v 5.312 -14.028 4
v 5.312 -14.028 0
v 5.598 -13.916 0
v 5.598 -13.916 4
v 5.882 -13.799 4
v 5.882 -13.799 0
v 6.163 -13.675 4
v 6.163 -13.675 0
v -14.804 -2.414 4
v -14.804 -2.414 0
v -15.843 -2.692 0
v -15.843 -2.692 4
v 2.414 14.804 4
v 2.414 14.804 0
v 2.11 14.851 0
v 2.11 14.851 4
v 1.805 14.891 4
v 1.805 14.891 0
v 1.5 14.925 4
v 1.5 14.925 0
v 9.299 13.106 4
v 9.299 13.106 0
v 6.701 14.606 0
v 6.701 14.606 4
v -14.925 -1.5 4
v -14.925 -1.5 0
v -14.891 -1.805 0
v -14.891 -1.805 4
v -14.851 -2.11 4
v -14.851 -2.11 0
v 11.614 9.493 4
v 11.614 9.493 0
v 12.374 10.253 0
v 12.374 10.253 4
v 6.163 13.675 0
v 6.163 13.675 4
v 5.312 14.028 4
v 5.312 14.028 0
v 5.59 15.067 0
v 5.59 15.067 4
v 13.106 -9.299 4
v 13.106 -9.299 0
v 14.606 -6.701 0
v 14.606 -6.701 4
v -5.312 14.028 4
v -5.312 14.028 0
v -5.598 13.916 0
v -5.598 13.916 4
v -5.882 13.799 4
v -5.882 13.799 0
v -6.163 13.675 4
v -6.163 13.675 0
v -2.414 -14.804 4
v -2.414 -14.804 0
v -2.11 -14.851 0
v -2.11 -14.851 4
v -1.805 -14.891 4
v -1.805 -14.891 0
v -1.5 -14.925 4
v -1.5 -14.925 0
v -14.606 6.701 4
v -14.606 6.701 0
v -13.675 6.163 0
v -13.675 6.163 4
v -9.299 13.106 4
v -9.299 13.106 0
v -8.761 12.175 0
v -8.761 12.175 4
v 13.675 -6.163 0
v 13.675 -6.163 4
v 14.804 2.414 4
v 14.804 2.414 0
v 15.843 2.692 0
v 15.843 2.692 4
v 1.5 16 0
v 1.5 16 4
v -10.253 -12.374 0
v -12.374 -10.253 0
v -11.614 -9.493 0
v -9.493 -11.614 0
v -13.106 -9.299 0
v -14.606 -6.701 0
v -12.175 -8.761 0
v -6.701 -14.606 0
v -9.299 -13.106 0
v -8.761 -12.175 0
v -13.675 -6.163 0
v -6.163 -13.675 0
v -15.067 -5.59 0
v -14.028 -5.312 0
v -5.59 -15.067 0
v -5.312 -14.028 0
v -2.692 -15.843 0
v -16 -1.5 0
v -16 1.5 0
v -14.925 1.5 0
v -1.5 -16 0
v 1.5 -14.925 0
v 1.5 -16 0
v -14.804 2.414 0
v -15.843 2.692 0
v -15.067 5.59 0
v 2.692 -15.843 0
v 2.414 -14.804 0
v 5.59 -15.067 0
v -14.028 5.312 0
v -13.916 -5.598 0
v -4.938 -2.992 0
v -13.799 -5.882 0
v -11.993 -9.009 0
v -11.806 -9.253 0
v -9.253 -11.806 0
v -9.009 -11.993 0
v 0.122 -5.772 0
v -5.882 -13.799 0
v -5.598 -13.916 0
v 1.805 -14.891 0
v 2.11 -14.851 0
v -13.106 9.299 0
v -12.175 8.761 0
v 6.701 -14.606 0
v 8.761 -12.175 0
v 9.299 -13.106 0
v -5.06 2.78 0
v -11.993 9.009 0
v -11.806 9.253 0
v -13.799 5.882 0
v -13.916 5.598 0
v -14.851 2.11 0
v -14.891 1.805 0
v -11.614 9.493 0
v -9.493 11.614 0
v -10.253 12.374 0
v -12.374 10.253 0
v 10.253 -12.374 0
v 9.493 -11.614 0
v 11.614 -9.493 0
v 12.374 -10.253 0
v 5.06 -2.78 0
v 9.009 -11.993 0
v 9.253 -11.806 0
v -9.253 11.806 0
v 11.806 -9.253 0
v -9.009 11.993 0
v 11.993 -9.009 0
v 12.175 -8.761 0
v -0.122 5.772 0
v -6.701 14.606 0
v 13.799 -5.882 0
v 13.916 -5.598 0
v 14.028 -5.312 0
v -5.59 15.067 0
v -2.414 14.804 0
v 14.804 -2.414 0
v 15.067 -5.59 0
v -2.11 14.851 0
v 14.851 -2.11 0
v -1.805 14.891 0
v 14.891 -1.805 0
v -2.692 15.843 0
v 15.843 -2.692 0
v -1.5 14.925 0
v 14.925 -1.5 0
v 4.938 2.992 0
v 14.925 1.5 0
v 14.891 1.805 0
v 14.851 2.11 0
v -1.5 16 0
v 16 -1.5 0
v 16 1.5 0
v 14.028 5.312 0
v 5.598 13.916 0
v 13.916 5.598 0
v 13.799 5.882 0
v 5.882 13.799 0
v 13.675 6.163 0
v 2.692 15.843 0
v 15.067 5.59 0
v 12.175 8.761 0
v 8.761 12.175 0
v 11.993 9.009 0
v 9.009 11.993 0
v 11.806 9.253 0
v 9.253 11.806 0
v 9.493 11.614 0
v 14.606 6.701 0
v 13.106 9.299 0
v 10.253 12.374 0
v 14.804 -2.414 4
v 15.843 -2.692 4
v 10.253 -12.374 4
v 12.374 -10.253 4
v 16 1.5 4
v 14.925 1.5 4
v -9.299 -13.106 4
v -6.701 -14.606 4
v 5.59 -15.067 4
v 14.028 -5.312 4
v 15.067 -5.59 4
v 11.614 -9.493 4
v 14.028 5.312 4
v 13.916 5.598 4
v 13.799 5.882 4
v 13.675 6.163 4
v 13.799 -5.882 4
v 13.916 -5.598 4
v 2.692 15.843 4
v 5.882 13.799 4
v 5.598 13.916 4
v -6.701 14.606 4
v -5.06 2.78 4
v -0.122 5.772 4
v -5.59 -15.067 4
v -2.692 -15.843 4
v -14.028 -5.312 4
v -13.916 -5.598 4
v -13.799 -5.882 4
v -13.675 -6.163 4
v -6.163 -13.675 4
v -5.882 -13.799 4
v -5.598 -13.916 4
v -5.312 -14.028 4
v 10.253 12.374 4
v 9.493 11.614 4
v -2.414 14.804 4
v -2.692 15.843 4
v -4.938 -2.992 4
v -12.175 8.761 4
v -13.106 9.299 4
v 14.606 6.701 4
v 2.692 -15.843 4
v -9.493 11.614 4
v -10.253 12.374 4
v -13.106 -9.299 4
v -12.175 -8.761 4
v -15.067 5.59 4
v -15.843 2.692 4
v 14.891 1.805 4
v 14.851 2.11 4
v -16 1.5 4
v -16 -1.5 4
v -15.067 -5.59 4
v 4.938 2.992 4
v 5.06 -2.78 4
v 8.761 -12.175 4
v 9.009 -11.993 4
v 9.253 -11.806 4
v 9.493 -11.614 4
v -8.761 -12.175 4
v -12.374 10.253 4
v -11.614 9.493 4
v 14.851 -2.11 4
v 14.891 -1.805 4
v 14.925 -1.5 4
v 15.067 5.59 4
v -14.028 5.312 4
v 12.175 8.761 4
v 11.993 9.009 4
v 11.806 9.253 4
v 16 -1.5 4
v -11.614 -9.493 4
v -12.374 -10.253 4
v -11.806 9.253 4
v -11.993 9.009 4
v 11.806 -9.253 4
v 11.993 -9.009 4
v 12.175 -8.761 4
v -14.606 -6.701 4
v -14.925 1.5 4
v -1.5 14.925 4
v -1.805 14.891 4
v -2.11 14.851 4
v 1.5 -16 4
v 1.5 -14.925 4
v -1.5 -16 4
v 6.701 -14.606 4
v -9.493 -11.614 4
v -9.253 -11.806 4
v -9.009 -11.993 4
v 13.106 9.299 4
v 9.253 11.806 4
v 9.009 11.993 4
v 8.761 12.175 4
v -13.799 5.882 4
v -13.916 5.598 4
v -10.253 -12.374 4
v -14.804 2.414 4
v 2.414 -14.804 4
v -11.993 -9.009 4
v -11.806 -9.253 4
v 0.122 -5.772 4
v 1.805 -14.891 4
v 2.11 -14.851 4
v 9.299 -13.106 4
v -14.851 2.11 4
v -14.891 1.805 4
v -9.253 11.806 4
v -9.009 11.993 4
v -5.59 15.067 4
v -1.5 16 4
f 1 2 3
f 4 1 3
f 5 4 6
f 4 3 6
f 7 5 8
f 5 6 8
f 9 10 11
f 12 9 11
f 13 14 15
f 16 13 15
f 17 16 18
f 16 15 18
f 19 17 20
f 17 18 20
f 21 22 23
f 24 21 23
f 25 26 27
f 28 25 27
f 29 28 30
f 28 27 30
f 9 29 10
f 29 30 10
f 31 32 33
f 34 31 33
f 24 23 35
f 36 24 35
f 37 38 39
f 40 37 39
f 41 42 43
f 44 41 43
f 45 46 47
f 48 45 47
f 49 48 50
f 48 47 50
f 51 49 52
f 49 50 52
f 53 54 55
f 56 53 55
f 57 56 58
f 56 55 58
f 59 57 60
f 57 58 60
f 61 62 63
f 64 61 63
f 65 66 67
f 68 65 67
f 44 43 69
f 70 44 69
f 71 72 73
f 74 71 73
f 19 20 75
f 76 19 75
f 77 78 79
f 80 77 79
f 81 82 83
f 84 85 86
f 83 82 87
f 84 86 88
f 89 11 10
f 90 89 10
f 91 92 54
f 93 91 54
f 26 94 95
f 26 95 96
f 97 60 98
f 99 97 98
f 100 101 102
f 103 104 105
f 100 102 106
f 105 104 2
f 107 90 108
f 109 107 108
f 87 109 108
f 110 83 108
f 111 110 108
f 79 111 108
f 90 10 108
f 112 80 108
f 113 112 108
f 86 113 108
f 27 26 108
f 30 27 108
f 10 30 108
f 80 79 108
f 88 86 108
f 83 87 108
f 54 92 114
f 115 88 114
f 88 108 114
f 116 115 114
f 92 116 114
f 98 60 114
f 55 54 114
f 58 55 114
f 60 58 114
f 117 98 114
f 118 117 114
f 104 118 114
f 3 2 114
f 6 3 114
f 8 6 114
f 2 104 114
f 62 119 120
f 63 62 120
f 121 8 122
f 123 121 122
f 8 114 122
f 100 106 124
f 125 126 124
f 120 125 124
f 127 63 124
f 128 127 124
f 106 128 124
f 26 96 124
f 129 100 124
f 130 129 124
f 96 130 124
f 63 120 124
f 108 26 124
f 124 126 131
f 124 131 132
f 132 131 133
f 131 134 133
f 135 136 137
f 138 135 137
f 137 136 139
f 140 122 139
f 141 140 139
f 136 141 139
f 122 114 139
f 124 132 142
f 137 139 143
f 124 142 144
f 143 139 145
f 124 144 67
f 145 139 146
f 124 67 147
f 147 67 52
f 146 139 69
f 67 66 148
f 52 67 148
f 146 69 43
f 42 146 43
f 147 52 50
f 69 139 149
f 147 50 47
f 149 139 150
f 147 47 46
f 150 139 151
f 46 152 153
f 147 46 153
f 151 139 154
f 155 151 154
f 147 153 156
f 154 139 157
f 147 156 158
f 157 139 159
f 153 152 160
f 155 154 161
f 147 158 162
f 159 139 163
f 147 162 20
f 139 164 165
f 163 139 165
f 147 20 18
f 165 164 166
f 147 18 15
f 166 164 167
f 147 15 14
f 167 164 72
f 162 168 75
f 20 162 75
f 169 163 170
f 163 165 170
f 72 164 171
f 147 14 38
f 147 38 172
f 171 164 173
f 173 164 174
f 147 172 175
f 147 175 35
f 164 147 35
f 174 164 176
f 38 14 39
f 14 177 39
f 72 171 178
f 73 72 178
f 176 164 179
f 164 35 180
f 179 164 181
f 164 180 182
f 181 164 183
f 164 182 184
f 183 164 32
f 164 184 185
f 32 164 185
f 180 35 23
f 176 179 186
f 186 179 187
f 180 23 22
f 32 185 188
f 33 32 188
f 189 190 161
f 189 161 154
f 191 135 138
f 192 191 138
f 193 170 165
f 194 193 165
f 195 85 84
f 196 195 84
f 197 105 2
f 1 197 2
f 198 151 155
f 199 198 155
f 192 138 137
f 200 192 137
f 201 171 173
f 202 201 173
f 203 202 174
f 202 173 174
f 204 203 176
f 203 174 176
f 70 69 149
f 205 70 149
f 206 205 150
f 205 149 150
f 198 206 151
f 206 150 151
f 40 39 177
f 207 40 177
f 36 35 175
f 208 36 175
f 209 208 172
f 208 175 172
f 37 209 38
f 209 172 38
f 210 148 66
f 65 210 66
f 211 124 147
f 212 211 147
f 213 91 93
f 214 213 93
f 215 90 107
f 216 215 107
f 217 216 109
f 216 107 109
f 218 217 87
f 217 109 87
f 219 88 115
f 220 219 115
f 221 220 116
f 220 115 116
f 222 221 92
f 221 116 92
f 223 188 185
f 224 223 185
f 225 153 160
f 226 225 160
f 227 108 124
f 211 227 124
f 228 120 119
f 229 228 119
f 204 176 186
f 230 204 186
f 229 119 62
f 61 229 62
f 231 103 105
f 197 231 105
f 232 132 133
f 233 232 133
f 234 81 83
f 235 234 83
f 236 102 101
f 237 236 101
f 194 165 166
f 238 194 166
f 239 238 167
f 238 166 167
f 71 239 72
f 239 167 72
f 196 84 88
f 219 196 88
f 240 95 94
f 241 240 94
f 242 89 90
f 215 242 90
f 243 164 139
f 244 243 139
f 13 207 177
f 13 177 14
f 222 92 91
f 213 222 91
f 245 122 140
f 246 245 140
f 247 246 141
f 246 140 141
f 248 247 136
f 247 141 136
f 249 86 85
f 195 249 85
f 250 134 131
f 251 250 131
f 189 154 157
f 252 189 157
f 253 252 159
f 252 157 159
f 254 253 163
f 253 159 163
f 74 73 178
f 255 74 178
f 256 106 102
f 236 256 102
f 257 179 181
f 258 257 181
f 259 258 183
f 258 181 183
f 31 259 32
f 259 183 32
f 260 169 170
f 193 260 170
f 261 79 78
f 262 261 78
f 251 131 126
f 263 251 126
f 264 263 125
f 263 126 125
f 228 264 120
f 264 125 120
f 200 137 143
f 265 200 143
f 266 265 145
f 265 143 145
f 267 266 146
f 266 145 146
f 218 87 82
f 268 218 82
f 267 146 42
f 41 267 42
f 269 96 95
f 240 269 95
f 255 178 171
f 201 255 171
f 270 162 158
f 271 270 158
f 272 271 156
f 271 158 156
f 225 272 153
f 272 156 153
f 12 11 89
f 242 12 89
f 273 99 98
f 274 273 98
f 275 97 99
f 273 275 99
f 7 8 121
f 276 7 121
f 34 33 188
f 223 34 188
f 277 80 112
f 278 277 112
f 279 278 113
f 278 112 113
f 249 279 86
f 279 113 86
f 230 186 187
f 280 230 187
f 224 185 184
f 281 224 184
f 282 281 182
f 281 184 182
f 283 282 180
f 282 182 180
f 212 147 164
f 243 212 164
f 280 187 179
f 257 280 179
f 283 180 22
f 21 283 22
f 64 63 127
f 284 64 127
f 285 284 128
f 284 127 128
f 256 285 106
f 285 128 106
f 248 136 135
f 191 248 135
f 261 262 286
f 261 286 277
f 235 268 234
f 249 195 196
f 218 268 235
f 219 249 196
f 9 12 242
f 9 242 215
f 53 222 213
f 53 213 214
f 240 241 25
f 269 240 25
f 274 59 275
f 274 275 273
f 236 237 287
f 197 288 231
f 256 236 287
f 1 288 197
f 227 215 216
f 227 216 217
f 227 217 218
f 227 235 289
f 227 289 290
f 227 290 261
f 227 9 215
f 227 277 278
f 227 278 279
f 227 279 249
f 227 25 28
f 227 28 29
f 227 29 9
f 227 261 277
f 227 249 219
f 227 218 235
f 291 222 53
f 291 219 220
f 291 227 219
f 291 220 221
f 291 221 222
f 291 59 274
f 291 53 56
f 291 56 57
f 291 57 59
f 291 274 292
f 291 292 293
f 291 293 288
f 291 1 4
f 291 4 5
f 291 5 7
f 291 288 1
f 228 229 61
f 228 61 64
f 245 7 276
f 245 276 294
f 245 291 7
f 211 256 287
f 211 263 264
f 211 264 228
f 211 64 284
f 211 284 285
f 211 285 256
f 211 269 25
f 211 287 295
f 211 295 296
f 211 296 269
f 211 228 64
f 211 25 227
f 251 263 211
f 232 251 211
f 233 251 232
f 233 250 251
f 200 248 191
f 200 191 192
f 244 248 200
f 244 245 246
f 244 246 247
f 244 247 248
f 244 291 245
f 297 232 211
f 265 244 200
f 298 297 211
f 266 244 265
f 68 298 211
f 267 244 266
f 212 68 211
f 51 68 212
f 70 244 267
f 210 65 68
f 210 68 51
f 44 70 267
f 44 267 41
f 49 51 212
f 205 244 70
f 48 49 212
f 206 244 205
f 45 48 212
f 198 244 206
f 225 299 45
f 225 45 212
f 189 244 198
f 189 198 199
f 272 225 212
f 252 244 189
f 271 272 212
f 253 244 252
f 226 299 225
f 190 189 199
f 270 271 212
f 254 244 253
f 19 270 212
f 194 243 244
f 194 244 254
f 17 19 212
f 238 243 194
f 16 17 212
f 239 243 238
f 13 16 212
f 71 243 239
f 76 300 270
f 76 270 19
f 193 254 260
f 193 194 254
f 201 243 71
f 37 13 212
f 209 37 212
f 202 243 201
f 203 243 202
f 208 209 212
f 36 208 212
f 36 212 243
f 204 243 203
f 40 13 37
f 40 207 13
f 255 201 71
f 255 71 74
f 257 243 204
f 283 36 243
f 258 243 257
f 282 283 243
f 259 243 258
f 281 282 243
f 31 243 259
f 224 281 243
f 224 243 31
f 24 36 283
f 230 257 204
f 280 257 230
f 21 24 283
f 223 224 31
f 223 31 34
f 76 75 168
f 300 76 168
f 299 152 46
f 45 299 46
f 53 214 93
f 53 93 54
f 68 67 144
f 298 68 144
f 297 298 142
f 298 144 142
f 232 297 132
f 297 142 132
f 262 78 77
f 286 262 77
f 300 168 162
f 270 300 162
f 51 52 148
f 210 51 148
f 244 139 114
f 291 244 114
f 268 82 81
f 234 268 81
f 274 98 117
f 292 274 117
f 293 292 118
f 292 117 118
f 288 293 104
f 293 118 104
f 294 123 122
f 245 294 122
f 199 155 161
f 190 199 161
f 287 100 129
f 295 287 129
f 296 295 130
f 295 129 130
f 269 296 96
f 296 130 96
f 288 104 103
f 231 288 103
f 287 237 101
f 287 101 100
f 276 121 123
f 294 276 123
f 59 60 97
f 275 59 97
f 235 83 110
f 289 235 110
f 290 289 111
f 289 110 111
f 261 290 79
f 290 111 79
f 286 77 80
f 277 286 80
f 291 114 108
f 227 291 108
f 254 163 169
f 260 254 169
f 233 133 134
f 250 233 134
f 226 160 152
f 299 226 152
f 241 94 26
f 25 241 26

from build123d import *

# Parameters (mm, degrees)
F1_DEPTH = 4


with BuildPart() as f1:
    # F0 (on Top) → F1 (new body)
    with BuildSketch(Plane.XY):
        with BuildLine():
            ThreePointArc((-14.80449, -2.413937), (-14.488887, -3.882286), (-14.028032, -5.311714))
            Line((-14.028032, -5.311714), (-13.134733, -5.072355))
            Line((-13.134733, -5.072355), (-13.91119, -2.174578))
            Line((-13.91119, -2.174578), (-14.80449, -2.413937))
        make_face()
        with BuildLine():
            Line((-10.253048, -12.374369), (-9.492775, -11.614096))
            ThreePointArc((-9.492775, -11.614096), (-10.606602, -10.606602), (-11.614096, -9.492775))
            Line((-11.614096, -9.492775), (-12.374369, -10.253048))
            Line((-12.374369, -10.253048), (-10.253048, -12.374369))
        make_face()
        with BuildLine():
            Line((14.606406, -6.700962), (13.675266, -6.163368))
            ThreePointArc((13.675266, -6.163368), (12.990381, -7.5), (12.175266, -8.761444))
            Line((12.175266, -8.761444), (13.106406, -9.299038))
            Line((13.106406, -9.299038), (14.606406, -6.700962))
        make_face()
        with BuildLine():
            Line((-14, 1.5), (-14.924812, 1.5))
            ThreePointArc((-14.924812, 1.5), (-15, 0), (-14.924812, -1.5))
            Line((-14.924812, -1.5), (-14, -1.5))
            Line((-14, -1.5), (-14, 1.5))
        make_face()
        with BuildLine():
            Line((12.374369, -10.253048), (11.614096, -9.492775))
            ThreePointArc((11.614096, -9.492775), (10.606602, -10.606602), (9.492775, -11.614096))
            Line((9.492775, -11.614096), (10.253048, -12.374369))
            Line((10.253048, -12.374369), (12.374369, -10.253048))
        make_face()
        with BuildLine():
            Line((-13.134733, 5.072355), (-14.028032, 5.311714))
            ThreePointArc((-14.028032, 5.311714), (-14.488887, 3.882286), (-14.80449, 2.413937))
            Line((-14.80449, 2.413937), (-13.91119, 2.174578))
            Line((-13.91119, 2.174578), (-13.134733, 5.072355))
        make_face()
        with BuildLine():
            Line((-13.106406, -9.299038), (-12.175266, -8.761444))
            ThreePointArc((-12.175266, -8.761444), (-12.990381, -7.5), (-13.675266, -6.163368))
            Line((-13.675266, -6.163368), (-14.606406, -6.700962))
            Line((-14.606406, -6.700962), (-13.106406, -9.299038))
        make_face()
        with BuildLine():
            Line((9.299038, -13.106406), (8.761444, -12.175266))
            ThreePointArc((8.761444, -12.175266), (7.5, -12.990381), (6.163368, -13.675266))
            Line((6.163368, -13.675266), (6.700962, -14.606406))
            Line((6.700962, -14.606406), (9.299038, -13.106406))
        make_face()
        with BuildLine():
            Line((-11.374356, 8.299038), (-12.175266, 8.761444))
            ThreePointArc((-12.175266, 8.761444), (-12.990381, 7.5), (-13.675266, 6.163368))
            Line((-13.675266, 6.163368), (-12.874356, 5.700962))
            Line((-12.874356, 5.700962), (-11.374356, 8.299038))
        make_face()
        with BuildLine():
            Line((5.589993, -15.066585), (5.311714, -14.028032))
            ThreePointArc((5.311714, -14.028032), (3.882286, -14.488887), (2.413937, -14.80449))
            Line((2.413937, -14.80449), (2.692216, -15.843042))
            Line((2.692216, -15.843042), (5.589993, -15.066585))
        make_face()
        with BuildLine():
            Line((-8.838835, 10.960155), (-9.492775, 11.614096))
            ThreePointArc((-9.492775, 11.614096), (-10.606602, 10.606602), (-11.614096, 9.492775))
            Line((-11.614096, 9.492775), (-10.960155, 8.838835))
            Line((-10.960155, 8.838835), (-8.838835, 10.960155))
        make_face()
        with BuildLine():
            Line((14, 1.5), (14.924812, 1.5))
            ThreePointArc((14.924812, 1.5), (14.871673, 1.957893), (14.80449, 2.413937))
            Line((14.80449, 2.413937), (13.91119, 2.174578))
            Line((13.91119, 2.174578), (13.134733, 5.072355))
            Line((13.134733, 5.072355), (14.028032, 5.311714))
            ThreePointArc((14.028032, 5.311714), (13.858193, 5.740251), (13.675266, 6.163368))
            Line((13.675266, 6.163368), (12.874356, 5.700962))
            Line((12.874356, 5.700962), (11.374356, 8.299038))
            Line((11.374356, 8.299038), (12.175266, 8.761444))
            ThreePointArc((12.175266, 8.761444), (11.9003, 9.131421), (11.614096, 9.492775))
            Line((11.614096, 9.492775), (10.960155, 8.838835))
            Line((10.960155, 8.838835), (8.838835, 10.960155))
            Line((8.838835, 10.960155), (9.492775, 11.614096))
            ThreePointArc((9.492775, 11.614096), (9.131421, 11.9003), (8.761444, 12.175266))
            Line((8.761444, 12.175266), (8.299038, 11.374356))
            Line((8.299038, 11.374356), (5.700962, 12.874356))
            Line((5.700962, 12.874356), (6.163368, 13.675266))
            ThreePointArc((6.163368, 13.675266), (5.740251, 13.858193), (5.311714, 14.028032))
            Line((5.311714, 14.028032), (5.072355, 13.134733))
            Line((5.072355, 13.134733), (2.174578, 13.91119))
            Line((2.174578, 13.91119), (2.413937, 14.80449))
            ThreePointArc((2.413937, 14.80449), (1.957893, 14.871673), (1.5, 14.924812))
            Line((1.5, 14.924812), (1.5, 14))
            Line((1.5, 14), (-1.5, 14))
            Line((-1.5, 14), (-1.5, 14.924812))
            ThreePointArc((-1.5, 14.924812), (-1.957893, 14.871673), (-2.413937, 14.80449))
            Line((-2.413937, 14.80449), (-2.174578, 13.91119))
            Line((-2.174578, 13.91119), (-5.072355, 13.134733))
            Line((-5.072355, 13.134733), (-5.311714, 14.028032))
            ThreePointArc((-5.311714, 14.028032), (-5.740251, 13.858193), (-6.163368, 13.675266))
            Line((-6.163368, 13.675266), (-5.700962, 12.874356))
            Line((-5.700962, 12.874356), (-8.299038, 11.374356))
            Line((-8.299038, 11.374356), (-8.761444, 12.175266))
            ThreePointArc((-8.761444, 12.175266), (-9.131421, 11.9003), (-9.492775, 11.614096))
            Line((-9.492775, 11.614096), (-8.838835, 10.960155))
            Line((-8.838835, 10.960155), (-10.960155, 8.838835))
            Line((-10.960155, 8.838835), (-11.614096, 9.492775))
            ThreePointArc((-11.614096, 9.492775), (-11.9003, 9.131421), (-12.175266, 8.761444))
            Line((-12.175266, 8.761444), (-11.374356, 8.299038))
            Line((-11.374356, 8.299038), (-12.874356, 5.700962))
            Line((-12.874356, 5.700962), (-13.675266, 6.163368))
            ThreePointArc((-13.675266, 6.163368), (-13.858193, 5.740251), (-14.028032, 5.311714))
            Line((-14.028032, 5.311714), (-13.134733, 5.072355))
            Line((-13.134733, 5.072355), (-13.91119, 2.174578))
            Line((-13.91119, 2.174578), (-14.80449, 2.413937))
            ThreePointArc((-14.80449, 2.413937), (-14.871673, 1.957893), (-14.924812, 1.5))
            Line((-14.924812, 1.5), (-14, 1.5))
            Line((-14, 1.5), (-14, -1.5))
            Line((-14, -1.5), (-14.924812, -1.5))
            ThreePointArc((-14.924812, -1.5), (-14.871673, -1.957893), (-14.80449, -2.413937))
            Line((-14.80449, -2.413937), (-13.91119, -2.174578))
            Line((-13.91119, -2.174578), (-13.134733, -5.072355))
            Line((-13.134733, -5.072355), (-14.028032, -5.311714))
            ThreePointArc((-14.028032, -5.311714), (-13.858193, -5.740251), (-13.675266, -6.163368))
            Line((-13.675266, -6.163368), (-12.874356, -5.700962))
            Line((-12.874356, -5.700962), (-11.374356, -8.299038))
            Line((-11.374356, -8.299038), (-12.175266, -8.761444))
            ThreePointArc((-12.175266, -8.761444), (-11.9003, -9.131421), (-11.614096, -9.492775))
            Line((-11.614096, -9.492775), (-10.960155, -8.838835))
            Line((-10.960155, -8.838835), (-8.838835, -10.960155))
            Line((-8.838835, -10.960155), (-9.492775, -11.614096))
            ThreePointArc((-9.492775, -11.614096), (-9.131421, -11.9003), (-8.761444, -12.175266))
            Line((-8.761444, -12.175266), (-8.299038, -11.374356))
            Line((-8.299038, -11.374356), (-5.700962, -12.874356))
            Line((-5.700962, -12.874356), (-6.163368, -13.675266))
            ThreePointArc((-6.163368, -13.675266), (-5.740251, -13.858193), (-5.311714, -14.028032))
            Line((-5.311714, -14.028032), (-5.072355, -13.134733))
            Line((-5.072355, -13.134733), (-2.174578, -13.91119))
            Line((-2.174578, -13.91119), (-2.413937, -14.80449))
            ThreePointArc((-2.413937, -14.80449), (-1.957893, -14.871673), (-1.5, -14.924812))
            Line((-1.5, -14.924812), (-1.5, -14))
            Line((-1.5, -14), (1.5, -14))
            Line((1.5, -14), (1.5, -14.924812))
            ThreePointArc((1.5, -14.924812), (1.957893, -14.871673), (2.413937, -14.80449))
            Line((2.413937, -14.80449), (2.174578, -13.91119))
            Line((2.174578, -13.91119), (5.072355, -13.134733))
            Line((5.072355, -13.134733), (5.311714, -14.028032))
            ThreePointArc((5.311714, -14.028032), (5.740251, -13.858193), (6.163368, -13.675266))
            Line((6.163368, -13.675266), (5.700962, -12.874356))
            Line((5.700962, -12.874356), (8.299038, -11.374356))
            Line((8.299038, -11.374356), (8.761444, -12.175266))
            ThreePointArc((8.761444, -12.175266), (9.131421, -11.9003), (9.492775, -11.614096))
            Line((9.492775, -11.614096), (8.838835, -10.960155))
            Line((8.838835, -10.960155), (10.960155, -8.838835))
            Line((10.960155, -8.838835), (11.614096, -9.492775))
            ThreePointArc((11.614096, -9.492775), (11.9003, -9.131421), (12.175266, -8.761444))
            Line((12.175266, -8.761444), (11.374356, -8.299038))
            Line((11.374356, -8.299038), (12.874356, -5.700962))
            Line((12.874356, -5.700962), (13.675266, -6.163368))
            ThreePointArc((13.675266, -6.163368), (13.858193, -5.740251), (14.028032, -5.311714))
            Line((14.028032, -5.311714), (13.134733, -5.072355))
            Line((13.134733, -5.072355), (13.91119, -2.174578))
            Line((13.91119, -2.174578), (14.80449, -2.413937))
            ThreePointArc((14.80449, -2.413937), (14.871673, -1.957893), (14.924812, -1.5))
            Line((14.924812, -1.5), (14, -1.5))
            Line((14, -1.5), (14, 1.5))
        make_face()
        Polygon((5.059899, -2.780423), (0.122032, -5.772213), (-4.937867, -2.991789), (-5.059899, 2.780423), (-0.122032, 5.772213), (4.937867, 2.991789), align=None, mode=Mode.SUBTRACT)
        with BuildLine():
            Line((1.5, -16), (1.5, -14.924812))
            ThreePointArc((1.5, -14.924812), (0, -15), (-1.5, -14.924812))
            Line((-1.5, -14.924812), (-1.5, -16))
            Line((-1.5, -16), (1.5, -16))
        make_face()
        with BuildLine():
            Line((-6.700962, -14.606406), (-6.163368, -13.675266))
            ThreePointArc((-6.163368, -13.675266), (-7.5, -12.990381), (-8.761444, -12.175266))
            Line((-8.761444, -12.175266), (-9.299038, -13.106406))
            Line((-9.299038, -13.106406), (-6.700962, -14.606406))
        make_face()
        with BuildLine():
            Line((15.843042, -2.692216), (14.80449, -2.413937))
            ThreePointArc((14.80449, -2.413937), (14.488887, -3.882286), (14.028032, -5.311714))
            Line((14.028032, -5.311714), (15.066585, -5.589993))
            Line((15.066585, -5.589993), (15.843042, -2.692216))
        make_face()
        with BuildLine():
            ThreePointArc((-13.675266, -6.163368), (-12.990381, -7.5), (-12.175266, -8.761444))
            Line((-12.175266, -8.761444), (-11.374356, -8.299038))
            Line((-11.374356, -8.299038), (-12.874356, -5.700962))
            Line((-12.874356, -5.700962), (-13.675266, -6.163368))
        make_face()
        with BuildLine():
            Line((-5.700962, 12.874356), (-6.163368, 13.675266))
            ThreePointArc((-6.163368, 13.675266), (-7.5, 12.990381), (-8.761444, 12.175266))
            Line((-8.761444, 12.175266), (-8.299038, 11.374356))
            Line((-8.299038, 11.374356), (-5.700962, 12.874356))
        make_face()
        with BuildLine():
            ThreePointArc((14.924812, -1.5), (14.981191, -0.750942), (15, 0))
            ThreePointArc((15, 0), (14.981191, 0.750942), (14.924812, 1.5))
            Line((14.924812, 1.5), (14, 1.5))
            Line((14, 1.5), (14, -1.5))
            Line((14, -1.5), (14.924812, -1.5))
        make_face()
        with BuildLine():
            Line((-2.692216, -15.843042), (-2.413937, -14.80449))
            ThreePointArc((-2.413937, -14.80449), (-3.882286, -14.488887), (-5.311714, -14.028032))
            Line((-5.311714, -14.028032), (-5.589993, -15.066585))
            Line((-5.589993, -15.066585), (-2.692216, -15.843042))
        make_face()
        with BuildLine():
            Line((8.299038, 11.374356), (8.761444, 12.175266))
            ThreePointArc((8.761444, 12.175266), (7.5, 12.990381), (6.163368, 13.675266))
            Line((6.163368, 13.675266), (5.700962, 12.874356))
            Line((5.700962, 12.874356), (8.299038, 11.374356))
        make_face()
        with BuildLine():
            ThreePointArc((6.163368, -13.675266), (7.5, -12.990381), (8.761444, -12.175266))
            Line((8.761444, -12.175266), (8.299038, -11.374356))
            Line((8.299038, -11.374356), (5.700962, -12.874356))
            Line((5.700962, -12.874356), (6.163368, -13.675266))
        make_face()
        with BuildLine():
            ThreePointArc((12.175266, -8.761444), (12.990381, -7.5), (13.675266, -6.163368))
            Line((13.675266, -6.163368), (12.874356, -5.700962))
            Line((12.874356, -5.700962), (11.374356, -8.299038))
            Line((11.374356, -8.299038), (12.175266, -8.761444))
        make_face()
        with BuildLine():
            ThreePointArc((2.413937, -14.80449), (3.882286, -14.488887), (5.311714, -14.028032))
            Line((5.311714, -14.028032), (5.072355, -13.134733))
            Line((5.072355, -13.134733), (2.174578, -13.91119))
            Line((2.174578, -13.91119), (2.413937, -14.80449))
        make_face()
        with BuildLine():
            ThreePointArc((-1.5, -14.924812), (0, -15), (1.5, -14.924812))
            Line((1.5, -14.924812), (1.5, -14))
            Line((1.5, -14), (-1.5, -14))
            Line((-1.5, -14), (-1.5, -14.924812))
        make_face()
        with BuildLine():
            Line((12.874356, 5.700962), (13.675266, 6.163368))
            ThreePointArc((13.675266, 6.163368), (12.990381, 7.5), (12.175266, 8.761444))
            Line((12.175266, 8.761444), (11.374356, 8.299038))
            Line((11.374356, 8.299038), (12.874356, 5.700962))
        make_face()
        with BuildLine():
            Line((10.960155, 8.838835), (11.614096, 9.492775))
            ThreePointArc((11.614096, 9.492775), (10.606602, 10.606602), (9.492775, 11.614096))
            Line((9.492775, 11.614096), (8.838835, 10.960155))
            Line((8.838835, 10.960155), (10.960155, 8.838835))
        make_face()
        with BuildLine():
            ThreePointArc((9.492775, -11.614096), (10.606602, -10.606602), (11.614096, -9.492775))
            Line((11.614096, -9.492775), (10.960155, -8.838835))
            Line((10.960155, -8.838835), (8.838835, -10.960155))
            Line((8.838835, -10.960155), (9.492775, -11.614096))
        make_face()
        with BuildLine():
            Line((5.072355, 13.134733), (5.311714, 14.028032))
            ThreePointArc((5.311714, 14.028032), (3.882286, 14.488887), (2.413937, 14.80449))
            Line((2.413937, 14.80449), (2.174578, 13.91119))
            Line((2.174578, 13.91119), (5.072355, 13.134733))
        make_face()
        with BuildLine():
            ThreePointArc((14.028032, 5.311714), (14.488887, 3.882286), (14.80449, 2.413937))
            Line((14.80449, 2.413937), (15.843042, 2.692216))
            Line((15.843042, 2.692216), (15.066585, 5.589993))
            Line((15.066585, 5.589993), (14.028032, 5.311714))
        make_face()
        with BuildLine():
            ThreePointArc((12.175266, 8.761444), (12.990381, 7.5), (13.675266, 6.163368))
            Line((13.675266, 6.163368), (14.606406, 6.700962))
            Line((14.606406, 6.700962), (13.106406, 9.299038))
            Line((13.106406, 9.299038), (12.175266, 8.761444))
        make_face()
        with BuildLine():
            ThreePointArc((9.492775, 11.614096), (10.606602, 10.606602), (11.614096, 9.492775))
            Line((11.614096, 9.492775), (12.374369, 10.253048))
            Line((12.374369, 10.253048), (10.253048, 12.374369))
            Line((10.253048, 12.374369), (9.492775, 11.614096))
        make_face()
        with BuildLine():
            ThreePointArc((6.163368, 13.675266), (7.5, 12.990381), (8.761444, 12.175266))
            Line((8.761444, 12.175266), (9.299038, 13.106406))
            Line((9.299038, 13.106406), (6.700962, 14.606406))
            Line((6.700962, 14.606406), (6.163368, 13.675266))
        make_face()
        with BuildLine():
            ThreePointArc((2.413937, 14.80449), (3.882286, 14.488887), (5.311714, 14.028032))
            Line((5.311714, 14.028032), (5.589993, 15.066585))
            Line((5.589993, 15.066585), (2.692216, 15.843042))
            Line((2.692216, 15.843042), (2.413937, 14.80449))
        make_face()
        with BuildLine():
            ThreePointArc((-5.311714, 14.028032), (-3.882286, 14.488887), (-2.413937, 14.80449))
            Line((-2.413937, 14.80449), (-2.692216, 15.843042))
            Line((-2.692216, 15.843042), (-5.589993, 15.066585))
            Line((-5.589993, 15.066585), (-5.311714, 14.028032))
        make_face()
        with BuildLine():
            ThreePointArc((-8.761444, 12.175266), (-7.5, 12.990381), (-6.163368, 13.675266))
            Line((-6.163368, 13.675266), (-6.700962, 14.606406))
            Line((-6.700962, 14.606406), (-9.299038, 13.106406))
            Line((-9.299038, 13.106406), (-8.761444, 12.175266))
        make_face()
        with BuildLine():
            ThreePointArc((-11.614096, 9.492775), (-10.606602, 10.606602), (-9.492775, 11.614096))
            Line((-9.492775, 11.614096), (-10.253048, 12.374369))
            Line((-10.253048, 12.374369), (-12.374369, 10.253048))
            Line((-12.374369, 10.253048), (-11.614096, 9.492775))
        make_face()
        with BuildLine():
            ThreePointArc((-13.675266, 6.163368), (-12.990381, 7.5), (-12.175266, 8.761444))
            Line((-12.175266, 8.761444), (-13.106406, 9.299038))
            Line((-13.106406, 9.299038), (-14.606406, 6.700962))
            Line((-14.606406, 6.700962), (-13.675266, 6.163368))
        make_face()
        with BuildLine():
            ThreePointArc((-14.80449, 2.413937), (-14.488887, 3.882286), (-14.028032, 5.311714))
            Line((-14.028032, 5.311714), (-15.066585, 5.589993))
            Line((-15.066585, 5.589993), (-15.843042, 2.692216))
            Line((-15.843042, 2.692216), (-14.80449, 2.413937))
        make_face()
        with BuildLine():
            ThreePointArc((-14.924812, -1.5), (-15, 0), (-14.924812, 1.5))
            Line((-14.924812, 1.5), (-16, 1.5))
            Line((-16, 1.5), (-16, -1.5))
            Line((-16, -1.5), (-14.924812, -1.5))
        make_face()
        with BuildLine():
            Line((-15.066585, -5.589993), (-14.028032, -5.311714))
            ThreePointArc((-14.028032, -5.311714), (-14.488887, -3.882286), (-14.80449, -2.413937))
            Line((-14.80449, -2.413937), (-15.843042, -2.692216))
            Line((-15.843042, -2.692216), (-15.066585, -5.589993))
        make_face()
        with BuildLine():
            ThreePointArc((-11.614096, -9.492775), (-10.606602, -10.606602), (-9.492775, -11.614096))
            Line((-9.492775, -11.614096), (-8.838835, -10.960155))
            Line((-8.838835, -10.960155), (-10.960155, -8.838835))
            Line((-10.960155, -8.838835), (-11.614096, -9.492775))
        make_face()
        with BuildLine():
            ThreePointArc((14.924812, 1.5), (14.981191, 0.750942), (15, 0))
            ThreePointArc((15, 0), (14.981191, -0.750942), (14.924812, -1.5))
            Line((14.924812, -1.5), (16, -1.5))
            Line((16, -1.5), (16, 1.5))
            Line((16, 1.5), (14.924812, 1.5))
        make_face()
        with BuildLine():
            ThreePointArc((-8.761444, -12.175266), (-7.5, -12.990381), (-6.163368, -13.675266))
            Line((-6.163368, -13.675266), (-5.700962, -12.874356))
            Line((-5.700962, -12.874356), (-8.299038, -11.374356))
            Line((-8.299038, -11.374356), (-8.761444, -12.175266))
        make_face()
        with BuildLine():
            Line((-2.174578, 13.91119), (-2.413937, 14.80449))
            ThreePointArc((-2.413937, 14.80449), (-3.882286, 14.488887), (-5.311714, 14.028032))
            Line((-5.311714, 14.028032), (-5.072355, 13.134733))
            Line((-5.072355, 13.134733), (-2.174578, 13.91119))
        make_face()
        with BuildLine():
            ThreePointArc((-5.311714, -14.028032), (-3.882286, -14.488887), (-2.413937, -14.80449))
            Line((-2.413937, -14.80449), (-2.174578, -13.91119))
            Line((-2.174578, -13.91119), (-5.072355, -13.134733))
            Line((-5.072355, -13.134733), (-5.311714, -14.028032))
        make_face()
        with BuildLine():
            Line((13.91119, 2.174578), (14.80449, 2.413937))
            ThreePointArc((14.80449, 2.413937), (14.488887, 3.882286), (14.028032, 5.311714))
            Line((14.028032, 5.311714), (13.134733, 5.072355))
            Line((13.134733, 5.072355), (13.91119, 2.174578))
        make_face()
        with BuildLine():
            ThreePointArc((14.028032, -5.311714), (14.488887, -3.882286), (14.80449, -2.413937))
            Line((14.80449, -2.413937), (13.91119, -2.174578))
            Line((13.91119, -2.174578), (13.134733, -5.072355))
            Line((13.134733, -5.072355), (14.028032, -5.311714))
        make_face()
        with BuildLine():
            Line((1.5, 14), (1.5, 14.924812))
            ThreePointArc((1.5, 14.924812), (0, 15), (-1.5, 14.924812))
            Line((-1.5, 14.924812), (-1.5, 14))
            Line((-1.5, 14), (1.5, 14))
        make_face()
        with BuildLine():
            ThreePointArc((-1.5, 14.924812), (0, 15), (1.5, 14.924812))
            Line((1.5, 14.924812), (1.5, 16))
            Line((1.5, 16), (-1.5, 16))
            Line((-1.5, 16), (-1.5, 14.924812))
        make_face()
    extrude(amount=F1_DEPTH)


solid = f1.part
